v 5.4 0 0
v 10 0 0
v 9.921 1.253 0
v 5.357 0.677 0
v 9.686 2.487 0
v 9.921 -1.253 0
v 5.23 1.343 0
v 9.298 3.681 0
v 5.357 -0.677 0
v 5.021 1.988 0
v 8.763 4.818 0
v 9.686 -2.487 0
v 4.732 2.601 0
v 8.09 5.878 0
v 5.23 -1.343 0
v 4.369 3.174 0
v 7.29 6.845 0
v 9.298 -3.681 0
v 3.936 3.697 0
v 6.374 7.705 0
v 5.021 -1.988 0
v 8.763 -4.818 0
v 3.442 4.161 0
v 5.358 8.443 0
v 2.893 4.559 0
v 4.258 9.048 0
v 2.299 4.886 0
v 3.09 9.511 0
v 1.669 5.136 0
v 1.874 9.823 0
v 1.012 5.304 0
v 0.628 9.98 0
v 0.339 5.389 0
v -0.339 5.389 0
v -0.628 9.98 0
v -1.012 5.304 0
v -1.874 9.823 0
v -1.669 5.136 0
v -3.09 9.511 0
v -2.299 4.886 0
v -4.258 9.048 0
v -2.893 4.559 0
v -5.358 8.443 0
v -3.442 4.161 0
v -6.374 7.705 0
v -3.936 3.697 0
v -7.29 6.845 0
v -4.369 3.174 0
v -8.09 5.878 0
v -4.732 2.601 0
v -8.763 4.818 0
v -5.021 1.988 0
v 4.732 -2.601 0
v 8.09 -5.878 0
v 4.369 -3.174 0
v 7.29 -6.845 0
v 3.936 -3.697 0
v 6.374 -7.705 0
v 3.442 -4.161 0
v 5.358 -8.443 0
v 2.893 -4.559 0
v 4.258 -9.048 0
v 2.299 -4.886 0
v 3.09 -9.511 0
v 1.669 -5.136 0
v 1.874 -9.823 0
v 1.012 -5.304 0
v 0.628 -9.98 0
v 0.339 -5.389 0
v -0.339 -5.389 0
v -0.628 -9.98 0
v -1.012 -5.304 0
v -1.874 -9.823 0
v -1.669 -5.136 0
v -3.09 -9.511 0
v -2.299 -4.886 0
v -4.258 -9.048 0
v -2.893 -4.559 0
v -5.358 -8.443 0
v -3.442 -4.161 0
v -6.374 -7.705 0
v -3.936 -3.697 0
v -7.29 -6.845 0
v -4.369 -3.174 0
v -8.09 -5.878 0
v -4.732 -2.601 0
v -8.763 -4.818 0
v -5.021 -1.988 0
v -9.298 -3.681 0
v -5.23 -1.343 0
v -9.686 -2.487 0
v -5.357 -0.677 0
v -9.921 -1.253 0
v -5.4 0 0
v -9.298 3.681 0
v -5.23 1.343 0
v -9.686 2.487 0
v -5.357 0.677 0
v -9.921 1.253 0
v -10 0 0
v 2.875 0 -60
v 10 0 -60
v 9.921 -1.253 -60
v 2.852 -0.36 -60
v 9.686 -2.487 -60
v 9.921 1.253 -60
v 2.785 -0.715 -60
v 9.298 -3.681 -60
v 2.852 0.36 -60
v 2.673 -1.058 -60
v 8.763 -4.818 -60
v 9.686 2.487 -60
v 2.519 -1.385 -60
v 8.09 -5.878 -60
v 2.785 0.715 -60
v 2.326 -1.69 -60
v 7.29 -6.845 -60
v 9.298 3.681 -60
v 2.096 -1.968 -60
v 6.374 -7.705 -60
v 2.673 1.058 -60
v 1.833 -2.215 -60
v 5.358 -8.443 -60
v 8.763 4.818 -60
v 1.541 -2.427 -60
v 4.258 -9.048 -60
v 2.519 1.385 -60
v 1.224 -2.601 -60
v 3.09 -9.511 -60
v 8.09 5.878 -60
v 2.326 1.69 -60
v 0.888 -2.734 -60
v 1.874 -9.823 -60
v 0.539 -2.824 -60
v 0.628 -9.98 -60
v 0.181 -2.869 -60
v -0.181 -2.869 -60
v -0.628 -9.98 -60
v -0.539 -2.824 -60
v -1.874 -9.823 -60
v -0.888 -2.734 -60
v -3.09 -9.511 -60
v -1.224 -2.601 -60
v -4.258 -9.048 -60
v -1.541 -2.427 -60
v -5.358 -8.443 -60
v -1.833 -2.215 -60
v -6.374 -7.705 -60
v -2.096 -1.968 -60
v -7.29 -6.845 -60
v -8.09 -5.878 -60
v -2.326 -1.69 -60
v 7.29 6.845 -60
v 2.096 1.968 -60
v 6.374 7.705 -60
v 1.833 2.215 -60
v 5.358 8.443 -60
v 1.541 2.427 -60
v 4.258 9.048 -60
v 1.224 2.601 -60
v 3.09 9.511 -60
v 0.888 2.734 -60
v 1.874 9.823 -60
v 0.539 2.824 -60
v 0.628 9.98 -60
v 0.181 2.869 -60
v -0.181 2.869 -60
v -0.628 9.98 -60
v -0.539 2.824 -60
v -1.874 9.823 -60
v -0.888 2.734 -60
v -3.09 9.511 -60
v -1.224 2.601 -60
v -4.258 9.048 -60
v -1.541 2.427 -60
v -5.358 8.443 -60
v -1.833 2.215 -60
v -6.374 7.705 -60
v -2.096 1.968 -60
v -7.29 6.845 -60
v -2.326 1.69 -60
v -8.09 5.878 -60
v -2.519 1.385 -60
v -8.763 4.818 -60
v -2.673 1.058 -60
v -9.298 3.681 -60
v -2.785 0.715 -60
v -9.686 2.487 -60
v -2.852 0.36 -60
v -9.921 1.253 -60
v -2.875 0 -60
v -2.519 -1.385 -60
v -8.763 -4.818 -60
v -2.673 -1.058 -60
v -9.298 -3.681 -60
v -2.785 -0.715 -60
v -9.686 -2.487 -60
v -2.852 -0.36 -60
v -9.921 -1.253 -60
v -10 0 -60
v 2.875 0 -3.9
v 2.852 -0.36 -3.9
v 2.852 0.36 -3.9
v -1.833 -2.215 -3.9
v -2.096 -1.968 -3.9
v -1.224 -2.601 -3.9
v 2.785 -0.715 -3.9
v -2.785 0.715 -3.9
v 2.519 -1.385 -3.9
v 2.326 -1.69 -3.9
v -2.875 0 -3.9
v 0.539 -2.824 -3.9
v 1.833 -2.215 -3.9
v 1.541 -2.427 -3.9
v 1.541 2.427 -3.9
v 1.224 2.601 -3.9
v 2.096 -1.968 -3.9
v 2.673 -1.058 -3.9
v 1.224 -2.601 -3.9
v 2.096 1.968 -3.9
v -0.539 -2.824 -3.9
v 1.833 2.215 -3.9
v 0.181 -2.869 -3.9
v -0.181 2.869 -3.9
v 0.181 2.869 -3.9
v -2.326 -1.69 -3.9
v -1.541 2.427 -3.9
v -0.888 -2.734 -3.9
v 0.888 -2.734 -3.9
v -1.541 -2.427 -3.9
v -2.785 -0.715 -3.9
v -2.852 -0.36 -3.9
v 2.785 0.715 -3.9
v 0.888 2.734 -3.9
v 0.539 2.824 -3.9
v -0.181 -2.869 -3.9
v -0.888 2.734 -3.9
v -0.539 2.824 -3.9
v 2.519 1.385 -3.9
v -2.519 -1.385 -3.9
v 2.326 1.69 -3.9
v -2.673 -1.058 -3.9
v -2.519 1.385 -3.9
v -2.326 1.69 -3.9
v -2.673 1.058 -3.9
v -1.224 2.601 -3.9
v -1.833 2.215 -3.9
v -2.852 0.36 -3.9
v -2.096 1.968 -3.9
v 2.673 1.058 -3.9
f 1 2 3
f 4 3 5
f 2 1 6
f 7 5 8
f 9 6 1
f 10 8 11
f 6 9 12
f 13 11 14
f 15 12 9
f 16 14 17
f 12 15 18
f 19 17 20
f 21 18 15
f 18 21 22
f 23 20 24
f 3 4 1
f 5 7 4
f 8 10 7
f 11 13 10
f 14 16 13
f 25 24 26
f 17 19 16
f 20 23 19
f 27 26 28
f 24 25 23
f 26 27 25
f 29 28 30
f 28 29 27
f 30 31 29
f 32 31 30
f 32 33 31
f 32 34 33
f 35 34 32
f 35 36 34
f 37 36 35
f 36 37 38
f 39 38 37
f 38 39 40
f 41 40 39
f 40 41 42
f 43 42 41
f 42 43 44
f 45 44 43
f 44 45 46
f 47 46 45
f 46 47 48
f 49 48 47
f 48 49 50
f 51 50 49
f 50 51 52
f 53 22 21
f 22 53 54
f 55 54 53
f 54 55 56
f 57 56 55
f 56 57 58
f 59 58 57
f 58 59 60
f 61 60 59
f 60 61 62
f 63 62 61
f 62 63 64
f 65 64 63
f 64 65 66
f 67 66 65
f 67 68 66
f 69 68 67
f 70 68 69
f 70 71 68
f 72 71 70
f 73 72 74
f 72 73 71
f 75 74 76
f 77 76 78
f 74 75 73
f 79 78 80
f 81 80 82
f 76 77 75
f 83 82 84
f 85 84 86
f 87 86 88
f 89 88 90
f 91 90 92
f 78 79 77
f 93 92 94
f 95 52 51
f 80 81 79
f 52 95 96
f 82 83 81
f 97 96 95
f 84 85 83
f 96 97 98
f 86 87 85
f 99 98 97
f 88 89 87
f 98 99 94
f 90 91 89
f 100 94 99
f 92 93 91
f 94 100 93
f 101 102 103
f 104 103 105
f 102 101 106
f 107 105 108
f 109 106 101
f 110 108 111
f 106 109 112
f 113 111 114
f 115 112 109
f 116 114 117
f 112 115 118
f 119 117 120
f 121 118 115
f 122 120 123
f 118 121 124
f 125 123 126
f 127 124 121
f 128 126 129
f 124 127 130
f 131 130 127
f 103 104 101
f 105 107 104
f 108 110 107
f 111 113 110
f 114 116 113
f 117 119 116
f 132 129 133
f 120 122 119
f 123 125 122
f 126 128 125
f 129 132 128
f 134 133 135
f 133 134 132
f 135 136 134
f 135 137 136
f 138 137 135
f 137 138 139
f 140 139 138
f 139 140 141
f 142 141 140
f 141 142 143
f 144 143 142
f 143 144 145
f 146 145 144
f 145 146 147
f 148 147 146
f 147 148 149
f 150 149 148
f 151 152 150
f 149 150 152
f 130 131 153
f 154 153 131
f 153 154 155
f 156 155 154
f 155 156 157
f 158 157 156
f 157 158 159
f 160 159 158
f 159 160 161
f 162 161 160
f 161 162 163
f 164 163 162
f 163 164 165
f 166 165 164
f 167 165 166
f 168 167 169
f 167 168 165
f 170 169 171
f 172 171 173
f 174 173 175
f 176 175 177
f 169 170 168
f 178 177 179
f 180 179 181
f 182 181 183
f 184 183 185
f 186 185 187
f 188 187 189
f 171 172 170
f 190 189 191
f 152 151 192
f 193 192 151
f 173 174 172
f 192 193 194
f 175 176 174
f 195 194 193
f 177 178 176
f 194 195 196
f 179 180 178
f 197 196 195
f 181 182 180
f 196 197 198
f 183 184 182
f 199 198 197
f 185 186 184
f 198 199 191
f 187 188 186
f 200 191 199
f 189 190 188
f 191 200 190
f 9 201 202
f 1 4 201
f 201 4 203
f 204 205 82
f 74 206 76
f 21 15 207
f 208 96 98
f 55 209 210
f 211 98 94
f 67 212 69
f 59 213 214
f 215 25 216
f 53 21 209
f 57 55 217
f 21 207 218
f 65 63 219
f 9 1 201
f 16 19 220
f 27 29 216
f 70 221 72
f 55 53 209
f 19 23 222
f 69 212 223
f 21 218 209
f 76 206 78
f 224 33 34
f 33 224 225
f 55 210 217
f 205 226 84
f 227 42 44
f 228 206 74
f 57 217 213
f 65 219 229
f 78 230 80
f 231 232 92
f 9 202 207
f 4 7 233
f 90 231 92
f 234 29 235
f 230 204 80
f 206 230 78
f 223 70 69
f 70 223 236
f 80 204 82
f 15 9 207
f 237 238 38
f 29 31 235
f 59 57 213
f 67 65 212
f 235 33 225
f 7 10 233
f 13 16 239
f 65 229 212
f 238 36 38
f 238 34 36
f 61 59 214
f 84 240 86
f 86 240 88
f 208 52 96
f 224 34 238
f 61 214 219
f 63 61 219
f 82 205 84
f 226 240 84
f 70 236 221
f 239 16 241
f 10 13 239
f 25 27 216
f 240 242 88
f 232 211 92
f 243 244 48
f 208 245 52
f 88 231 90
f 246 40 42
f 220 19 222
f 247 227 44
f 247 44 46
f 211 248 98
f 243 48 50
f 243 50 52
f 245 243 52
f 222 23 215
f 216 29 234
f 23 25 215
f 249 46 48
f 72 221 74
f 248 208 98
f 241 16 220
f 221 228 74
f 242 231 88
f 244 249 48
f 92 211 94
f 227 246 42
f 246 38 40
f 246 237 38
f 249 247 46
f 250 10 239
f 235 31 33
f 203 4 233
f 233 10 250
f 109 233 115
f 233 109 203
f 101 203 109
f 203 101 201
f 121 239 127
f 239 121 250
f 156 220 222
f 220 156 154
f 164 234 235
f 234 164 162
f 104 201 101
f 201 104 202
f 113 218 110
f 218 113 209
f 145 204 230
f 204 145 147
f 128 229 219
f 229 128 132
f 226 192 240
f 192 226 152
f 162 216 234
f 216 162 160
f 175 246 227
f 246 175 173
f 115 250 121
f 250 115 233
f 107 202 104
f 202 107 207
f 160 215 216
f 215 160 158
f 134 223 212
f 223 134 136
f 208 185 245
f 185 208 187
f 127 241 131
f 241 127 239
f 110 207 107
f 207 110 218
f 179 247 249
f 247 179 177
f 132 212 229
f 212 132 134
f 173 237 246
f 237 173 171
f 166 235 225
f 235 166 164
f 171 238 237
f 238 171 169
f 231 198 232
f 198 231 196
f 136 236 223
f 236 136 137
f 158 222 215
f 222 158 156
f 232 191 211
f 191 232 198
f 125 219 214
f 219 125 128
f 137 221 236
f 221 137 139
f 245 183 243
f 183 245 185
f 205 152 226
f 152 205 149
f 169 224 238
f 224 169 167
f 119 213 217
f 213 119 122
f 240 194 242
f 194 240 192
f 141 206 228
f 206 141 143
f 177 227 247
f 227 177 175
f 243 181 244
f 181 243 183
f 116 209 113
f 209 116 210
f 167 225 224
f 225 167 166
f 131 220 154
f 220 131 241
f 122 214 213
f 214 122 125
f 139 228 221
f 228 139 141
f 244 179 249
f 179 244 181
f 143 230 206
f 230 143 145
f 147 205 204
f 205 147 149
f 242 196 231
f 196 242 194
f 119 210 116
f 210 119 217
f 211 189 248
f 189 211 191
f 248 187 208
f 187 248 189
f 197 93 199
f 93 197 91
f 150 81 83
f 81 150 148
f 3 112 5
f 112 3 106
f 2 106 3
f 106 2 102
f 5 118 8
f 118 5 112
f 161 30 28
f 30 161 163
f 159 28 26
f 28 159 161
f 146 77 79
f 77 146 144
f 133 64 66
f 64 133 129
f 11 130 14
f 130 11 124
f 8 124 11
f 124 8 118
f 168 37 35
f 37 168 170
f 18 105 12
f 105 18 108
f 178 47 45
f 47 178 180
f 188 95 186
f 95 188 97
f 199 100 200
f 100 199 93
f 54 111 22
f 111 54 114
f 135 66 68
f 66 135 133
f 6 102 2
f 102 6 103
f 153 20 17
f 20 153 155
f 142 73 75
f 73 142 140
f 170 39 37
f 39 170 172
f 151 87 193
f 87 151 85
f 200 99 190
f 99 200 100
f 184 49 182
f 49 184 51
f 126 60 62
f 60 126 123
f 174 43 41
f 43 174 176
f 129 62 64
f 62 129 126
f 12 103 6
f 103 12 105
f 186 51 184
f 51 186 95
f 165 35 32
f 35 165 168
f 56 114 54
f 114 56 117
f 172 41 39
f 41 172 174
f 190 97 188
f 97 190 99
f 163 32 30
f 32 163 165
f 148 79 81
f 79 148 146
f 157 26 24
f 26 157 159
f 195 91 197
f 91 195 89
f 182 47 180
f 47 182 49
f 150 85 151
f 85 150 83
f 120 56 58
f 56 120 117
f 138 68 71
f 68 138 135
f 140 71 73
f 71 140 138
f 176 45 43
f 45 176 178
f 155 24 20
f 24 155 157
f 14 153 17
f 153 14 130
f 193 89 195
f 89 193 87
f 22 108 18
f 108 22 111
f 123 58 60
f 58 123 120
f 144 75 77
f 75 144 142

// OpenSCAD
$fn = 50;


difference() {
	union() {
		translate(v = [0, 0, -60.0000000000]) {
			cylinder(h = 60, r = 10.0000000000);
		}
		cylinder(h = 0, r = 19.0000000000);
	}
	union() {
		translate(v = [0, 0, 0]) {
			rotate(a = [0, 0, 0]) {
				difference() {
					union() {
						#translate(v = [0, 0, -60.0000000000]) {
							cylinder(h = 60, r = 2.6000000000);
						}
						#translate(v = [0, 0, -3.9000000000]) {
							cylinder(h = 3.9000000000, r = 10.0000000000, r1 = 2.8750000000, r2 = 5.4000000000);
						}
						#translate(v = [0, 0, -60.0000000000]) {
							cylinder(h = 60, r = 2.8750000000);
						}
						#translate(v = [0, 0, -60.0000000000]) {
							cylinder(h = 60, r = 2.6000000000);
						}
					}
					union();
				}
			}
		}
	}
}
